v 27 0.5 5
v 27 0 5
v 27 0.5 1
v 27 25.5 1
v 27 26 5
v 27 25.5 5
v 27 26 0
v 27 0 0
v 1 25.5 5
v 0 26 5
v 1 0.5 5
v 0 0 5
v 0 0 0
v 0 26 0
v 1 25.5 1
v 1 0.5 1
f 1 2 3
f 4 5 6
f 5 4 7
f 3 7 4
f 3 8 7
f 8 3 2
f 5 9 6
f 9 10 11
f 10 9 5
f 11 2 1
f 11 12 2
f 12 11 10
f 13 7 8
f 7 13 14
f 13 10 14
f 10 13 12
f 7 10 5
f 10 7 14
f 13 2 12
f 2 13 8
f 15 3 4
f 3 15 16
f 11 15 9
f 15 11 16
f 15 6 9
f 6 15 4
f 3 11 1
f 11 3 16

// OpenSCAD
$fn = 30;
eps = 0.01;
spc = 1.02;
spc2 = 0.5;

rpi_width = 65;
rpi_thickness = 5;
rpi_height = 30;
rpi_corner_r = 3.5;
rpi_hole_d = 2.5;
lower_thickness = 1;

module rpi_bounding_box_round() {
  hull() {
    r = rpi_corner_r;
    h = rpi_thickness;
    translate([r, r, 0]) cylinder(h = h, r = r);
    translate([-r, r, 0]) translate([rpi_width, 0, 0]) cylinder(h = h, r = r);
    translate([-r, -r, 0]) translate([rpi_width, rpi_height, 0]) cylinder(h = h, r = r);
    translate([r, -r, 0]) translate([0, rpi_height, 0]) cylinder(h = h, r = r);
  }
}
module rpi_pins() {
  d = rpi_hole_d;
  h = 2;
  margin = 3.5;
  translate([margin, margin, 0]) cylinder(h = h, d = d);
  translate([-margin, margin, 0]) translate([rpi_width, 0, 0]) cylinder(h = h, d = d);
  translate([-margin, -margin, 0]) translate([rpi_width, rpi_height, 0]) cylinder(h = h, d = d);
  translate([margin, -margin, 0]) translate([0, rpi_height, 0]) cylinder(h = h, d = d);

  translate([margin, margin, 0]) scale([1.2, 1.2, 0.2]) cylinder(h = h, d = d);
  translate([-margin, margin, 0]) translate([rpi_width, 0, 0]) scale([1.2, 1.2, 0.2]) cylinder(h = h, d = d);
  translate([-margin, -margin, 0]) translate([rpi_width, rpi_height, 0]) scale([1.2, 1.2, 0.2]) cylinder(h = h, d = d);
  translate([margin, -margin, 0]) translate([0, rpi_height, 0]) scale([1.2, 1.2, 0.2]) cylinder(h = h, d = d);
}

module lower() {
  difference() {
    hull() {
      r = rpi_corner_r;
      h = rpi_thickness + lower_thickness;
      thickness_offset = 2 * lower_thickness;
      translate([r, r, 0]) cylinder(h = h, r = r);
      translate([-r, r, 0]) translate([rpi_width + thickness_offset, 0, 0]) cylinder(h = h, r = r);
      translate([-r, -r, 0]) translate([rpi_width + thickness_offset, rpi_height + thickness_offset, 0]) cylinder(h = h, r = r);
      translate([r, -r, 0]) translate([0, rpi_height + thickness_offset, 0]) cylinder(h = h, r = r);
    }
    translate([lower_thickness, lower_thickness, lower_thickness + eps]) rpi_bounding_box_round();
    translate([-eps, 10.5, lower_thickness]) cube([lower_thickness + 2 * eps, 14, rpi_thickness + 2*eps]);
    translate([rpi_width + lower_thickness - eps, lower_thickness+rpi_height*0.2, lower_thickness]) cube([lower_thickness + 2 * eps, rpi_height*0.6, rpi_thickness + 2*eps]);
    translate([6.5, eps, lower_thickness]) cube([13, lower_thickness + 2*eps, rpi_thickness + 2*eps]);
    translate([rpi_width + 2*lower_thickness - 7 -22.5, eps, lower_thickness]) cube([22, lower_thickness + 2*eps, rpi_thickness + 2*eps]);
  }
}

module upper() {
  translate([rpi_width + 2*lower_thickness, 0, rpi_thickness + lower_thickness]) rotate([0, 180, 0]) {
    hull() {
      r = rpi_corner_r;
      h = lower_thickness;
      thickness_offset = 2 * lower_thickness;
      translate([r, r, 0]) cylinder(h = h, r = r);
      translate([-r, r, 0]) translate([rpi_width + thickness_offset, 0, 0]) cylinder(h = h, r = r);
      translate([-r, -r, 0]) translate([rpi_width + thickness_offset, rpi_height + thickness_offset, 0]) cylinder(h = h, r = r);
      translate([r, -r, 0]) translate([0, rpi_height + thickness_offset, 0]) cylinder(h = h, r = r);
    }
    color("green") translate([lower_thickness, lower_thickness, 0]) difference() {
      translate([0, 0, eps]) hull() {
        r = rpi_corner_r;
        h = rpi_thickness -eps;
        translate([r*spc, r*spc, 0]) cylinder(h = h, r = r);
        translate([-r*spc, r*spc, 0]) translate([rpi_width, 0, 0]) cylinder(h = h, r = r);
        translate([-r*spc, -r*spc, 0]) translate([rpi_width, rpi_height, 0]) cylinder(h = h, r = r);
        translate([r*spc, -r*spc, 0]) translate([0, rpi_height, 0]) cylinder(h = h, r = r);
      }
      translate([lower_thickness, lower_thickness, -eps]) hull() {
        r = rpi_corner_r;
        h = rpi_thickness + 2*eps;
        translate([r, r, 0]) cylinder(h = h, r = r);
        translate([-r, r, 0]) translate([rpi_width - 2*lower_thickness, 0, 0]) cylinder(h = h, r = r);
        translate([-r, -r, 0]) translate([rpi_width - 2*lower_thickness, rpi_height - 2*lower_thickness, 0]) cylinder(h = h, r = r);
        translate([r, -r, 0]) translate([0, rpi_height - 2*lower_thickness, 0]) cylinder(h = h, r = r);
      }
      translate([0, 0, -eps]) {
        translate([-eps, rpi_corner_r, 0]) cube([rpi_width+2*eps, rpi_height - 2 * rpi_corner_r, rpi_thickness + 2 * eps]);
        translate([rpi_corner_r, -eps, 0]) cube([rpi_width - 2 * rpi_corner_r, rpi_height+2*eps, rpi_thickness + 2 * eps]);
      }
    }
  }
}


/**
upper();
lower();
translate([lower_thickness, lower_thickness, lower_thickness]) {
 color("red") rpi_pins();
}
**/

rpicam_width = 25;
rpicam_thickness = 4;
rpicam_height = 24;
rpicam_lower_thickness = 1;

module rpicam_bounding_box_round() {
cube([rpicam_width + 2 * spc2, rpicam_height + 2 * spc2, rpicam_thickness + 2 * spc2 + eps]);
}

module rpicam_lower() {
  difference() {
    cube([rpicam_width + 2 * rpicam_lower_thickness, rpicam_height + 2 * rpicam_lower_thickness, rpicam_thickness + rpicam_lower_thickness]);
    translate([rpicam_lower_thickness, rpicam_lower_thickness - spc2, rpicam_lower_thickness]) rpicam_bounding_box_round();
  }
}

rpicam_lower();
